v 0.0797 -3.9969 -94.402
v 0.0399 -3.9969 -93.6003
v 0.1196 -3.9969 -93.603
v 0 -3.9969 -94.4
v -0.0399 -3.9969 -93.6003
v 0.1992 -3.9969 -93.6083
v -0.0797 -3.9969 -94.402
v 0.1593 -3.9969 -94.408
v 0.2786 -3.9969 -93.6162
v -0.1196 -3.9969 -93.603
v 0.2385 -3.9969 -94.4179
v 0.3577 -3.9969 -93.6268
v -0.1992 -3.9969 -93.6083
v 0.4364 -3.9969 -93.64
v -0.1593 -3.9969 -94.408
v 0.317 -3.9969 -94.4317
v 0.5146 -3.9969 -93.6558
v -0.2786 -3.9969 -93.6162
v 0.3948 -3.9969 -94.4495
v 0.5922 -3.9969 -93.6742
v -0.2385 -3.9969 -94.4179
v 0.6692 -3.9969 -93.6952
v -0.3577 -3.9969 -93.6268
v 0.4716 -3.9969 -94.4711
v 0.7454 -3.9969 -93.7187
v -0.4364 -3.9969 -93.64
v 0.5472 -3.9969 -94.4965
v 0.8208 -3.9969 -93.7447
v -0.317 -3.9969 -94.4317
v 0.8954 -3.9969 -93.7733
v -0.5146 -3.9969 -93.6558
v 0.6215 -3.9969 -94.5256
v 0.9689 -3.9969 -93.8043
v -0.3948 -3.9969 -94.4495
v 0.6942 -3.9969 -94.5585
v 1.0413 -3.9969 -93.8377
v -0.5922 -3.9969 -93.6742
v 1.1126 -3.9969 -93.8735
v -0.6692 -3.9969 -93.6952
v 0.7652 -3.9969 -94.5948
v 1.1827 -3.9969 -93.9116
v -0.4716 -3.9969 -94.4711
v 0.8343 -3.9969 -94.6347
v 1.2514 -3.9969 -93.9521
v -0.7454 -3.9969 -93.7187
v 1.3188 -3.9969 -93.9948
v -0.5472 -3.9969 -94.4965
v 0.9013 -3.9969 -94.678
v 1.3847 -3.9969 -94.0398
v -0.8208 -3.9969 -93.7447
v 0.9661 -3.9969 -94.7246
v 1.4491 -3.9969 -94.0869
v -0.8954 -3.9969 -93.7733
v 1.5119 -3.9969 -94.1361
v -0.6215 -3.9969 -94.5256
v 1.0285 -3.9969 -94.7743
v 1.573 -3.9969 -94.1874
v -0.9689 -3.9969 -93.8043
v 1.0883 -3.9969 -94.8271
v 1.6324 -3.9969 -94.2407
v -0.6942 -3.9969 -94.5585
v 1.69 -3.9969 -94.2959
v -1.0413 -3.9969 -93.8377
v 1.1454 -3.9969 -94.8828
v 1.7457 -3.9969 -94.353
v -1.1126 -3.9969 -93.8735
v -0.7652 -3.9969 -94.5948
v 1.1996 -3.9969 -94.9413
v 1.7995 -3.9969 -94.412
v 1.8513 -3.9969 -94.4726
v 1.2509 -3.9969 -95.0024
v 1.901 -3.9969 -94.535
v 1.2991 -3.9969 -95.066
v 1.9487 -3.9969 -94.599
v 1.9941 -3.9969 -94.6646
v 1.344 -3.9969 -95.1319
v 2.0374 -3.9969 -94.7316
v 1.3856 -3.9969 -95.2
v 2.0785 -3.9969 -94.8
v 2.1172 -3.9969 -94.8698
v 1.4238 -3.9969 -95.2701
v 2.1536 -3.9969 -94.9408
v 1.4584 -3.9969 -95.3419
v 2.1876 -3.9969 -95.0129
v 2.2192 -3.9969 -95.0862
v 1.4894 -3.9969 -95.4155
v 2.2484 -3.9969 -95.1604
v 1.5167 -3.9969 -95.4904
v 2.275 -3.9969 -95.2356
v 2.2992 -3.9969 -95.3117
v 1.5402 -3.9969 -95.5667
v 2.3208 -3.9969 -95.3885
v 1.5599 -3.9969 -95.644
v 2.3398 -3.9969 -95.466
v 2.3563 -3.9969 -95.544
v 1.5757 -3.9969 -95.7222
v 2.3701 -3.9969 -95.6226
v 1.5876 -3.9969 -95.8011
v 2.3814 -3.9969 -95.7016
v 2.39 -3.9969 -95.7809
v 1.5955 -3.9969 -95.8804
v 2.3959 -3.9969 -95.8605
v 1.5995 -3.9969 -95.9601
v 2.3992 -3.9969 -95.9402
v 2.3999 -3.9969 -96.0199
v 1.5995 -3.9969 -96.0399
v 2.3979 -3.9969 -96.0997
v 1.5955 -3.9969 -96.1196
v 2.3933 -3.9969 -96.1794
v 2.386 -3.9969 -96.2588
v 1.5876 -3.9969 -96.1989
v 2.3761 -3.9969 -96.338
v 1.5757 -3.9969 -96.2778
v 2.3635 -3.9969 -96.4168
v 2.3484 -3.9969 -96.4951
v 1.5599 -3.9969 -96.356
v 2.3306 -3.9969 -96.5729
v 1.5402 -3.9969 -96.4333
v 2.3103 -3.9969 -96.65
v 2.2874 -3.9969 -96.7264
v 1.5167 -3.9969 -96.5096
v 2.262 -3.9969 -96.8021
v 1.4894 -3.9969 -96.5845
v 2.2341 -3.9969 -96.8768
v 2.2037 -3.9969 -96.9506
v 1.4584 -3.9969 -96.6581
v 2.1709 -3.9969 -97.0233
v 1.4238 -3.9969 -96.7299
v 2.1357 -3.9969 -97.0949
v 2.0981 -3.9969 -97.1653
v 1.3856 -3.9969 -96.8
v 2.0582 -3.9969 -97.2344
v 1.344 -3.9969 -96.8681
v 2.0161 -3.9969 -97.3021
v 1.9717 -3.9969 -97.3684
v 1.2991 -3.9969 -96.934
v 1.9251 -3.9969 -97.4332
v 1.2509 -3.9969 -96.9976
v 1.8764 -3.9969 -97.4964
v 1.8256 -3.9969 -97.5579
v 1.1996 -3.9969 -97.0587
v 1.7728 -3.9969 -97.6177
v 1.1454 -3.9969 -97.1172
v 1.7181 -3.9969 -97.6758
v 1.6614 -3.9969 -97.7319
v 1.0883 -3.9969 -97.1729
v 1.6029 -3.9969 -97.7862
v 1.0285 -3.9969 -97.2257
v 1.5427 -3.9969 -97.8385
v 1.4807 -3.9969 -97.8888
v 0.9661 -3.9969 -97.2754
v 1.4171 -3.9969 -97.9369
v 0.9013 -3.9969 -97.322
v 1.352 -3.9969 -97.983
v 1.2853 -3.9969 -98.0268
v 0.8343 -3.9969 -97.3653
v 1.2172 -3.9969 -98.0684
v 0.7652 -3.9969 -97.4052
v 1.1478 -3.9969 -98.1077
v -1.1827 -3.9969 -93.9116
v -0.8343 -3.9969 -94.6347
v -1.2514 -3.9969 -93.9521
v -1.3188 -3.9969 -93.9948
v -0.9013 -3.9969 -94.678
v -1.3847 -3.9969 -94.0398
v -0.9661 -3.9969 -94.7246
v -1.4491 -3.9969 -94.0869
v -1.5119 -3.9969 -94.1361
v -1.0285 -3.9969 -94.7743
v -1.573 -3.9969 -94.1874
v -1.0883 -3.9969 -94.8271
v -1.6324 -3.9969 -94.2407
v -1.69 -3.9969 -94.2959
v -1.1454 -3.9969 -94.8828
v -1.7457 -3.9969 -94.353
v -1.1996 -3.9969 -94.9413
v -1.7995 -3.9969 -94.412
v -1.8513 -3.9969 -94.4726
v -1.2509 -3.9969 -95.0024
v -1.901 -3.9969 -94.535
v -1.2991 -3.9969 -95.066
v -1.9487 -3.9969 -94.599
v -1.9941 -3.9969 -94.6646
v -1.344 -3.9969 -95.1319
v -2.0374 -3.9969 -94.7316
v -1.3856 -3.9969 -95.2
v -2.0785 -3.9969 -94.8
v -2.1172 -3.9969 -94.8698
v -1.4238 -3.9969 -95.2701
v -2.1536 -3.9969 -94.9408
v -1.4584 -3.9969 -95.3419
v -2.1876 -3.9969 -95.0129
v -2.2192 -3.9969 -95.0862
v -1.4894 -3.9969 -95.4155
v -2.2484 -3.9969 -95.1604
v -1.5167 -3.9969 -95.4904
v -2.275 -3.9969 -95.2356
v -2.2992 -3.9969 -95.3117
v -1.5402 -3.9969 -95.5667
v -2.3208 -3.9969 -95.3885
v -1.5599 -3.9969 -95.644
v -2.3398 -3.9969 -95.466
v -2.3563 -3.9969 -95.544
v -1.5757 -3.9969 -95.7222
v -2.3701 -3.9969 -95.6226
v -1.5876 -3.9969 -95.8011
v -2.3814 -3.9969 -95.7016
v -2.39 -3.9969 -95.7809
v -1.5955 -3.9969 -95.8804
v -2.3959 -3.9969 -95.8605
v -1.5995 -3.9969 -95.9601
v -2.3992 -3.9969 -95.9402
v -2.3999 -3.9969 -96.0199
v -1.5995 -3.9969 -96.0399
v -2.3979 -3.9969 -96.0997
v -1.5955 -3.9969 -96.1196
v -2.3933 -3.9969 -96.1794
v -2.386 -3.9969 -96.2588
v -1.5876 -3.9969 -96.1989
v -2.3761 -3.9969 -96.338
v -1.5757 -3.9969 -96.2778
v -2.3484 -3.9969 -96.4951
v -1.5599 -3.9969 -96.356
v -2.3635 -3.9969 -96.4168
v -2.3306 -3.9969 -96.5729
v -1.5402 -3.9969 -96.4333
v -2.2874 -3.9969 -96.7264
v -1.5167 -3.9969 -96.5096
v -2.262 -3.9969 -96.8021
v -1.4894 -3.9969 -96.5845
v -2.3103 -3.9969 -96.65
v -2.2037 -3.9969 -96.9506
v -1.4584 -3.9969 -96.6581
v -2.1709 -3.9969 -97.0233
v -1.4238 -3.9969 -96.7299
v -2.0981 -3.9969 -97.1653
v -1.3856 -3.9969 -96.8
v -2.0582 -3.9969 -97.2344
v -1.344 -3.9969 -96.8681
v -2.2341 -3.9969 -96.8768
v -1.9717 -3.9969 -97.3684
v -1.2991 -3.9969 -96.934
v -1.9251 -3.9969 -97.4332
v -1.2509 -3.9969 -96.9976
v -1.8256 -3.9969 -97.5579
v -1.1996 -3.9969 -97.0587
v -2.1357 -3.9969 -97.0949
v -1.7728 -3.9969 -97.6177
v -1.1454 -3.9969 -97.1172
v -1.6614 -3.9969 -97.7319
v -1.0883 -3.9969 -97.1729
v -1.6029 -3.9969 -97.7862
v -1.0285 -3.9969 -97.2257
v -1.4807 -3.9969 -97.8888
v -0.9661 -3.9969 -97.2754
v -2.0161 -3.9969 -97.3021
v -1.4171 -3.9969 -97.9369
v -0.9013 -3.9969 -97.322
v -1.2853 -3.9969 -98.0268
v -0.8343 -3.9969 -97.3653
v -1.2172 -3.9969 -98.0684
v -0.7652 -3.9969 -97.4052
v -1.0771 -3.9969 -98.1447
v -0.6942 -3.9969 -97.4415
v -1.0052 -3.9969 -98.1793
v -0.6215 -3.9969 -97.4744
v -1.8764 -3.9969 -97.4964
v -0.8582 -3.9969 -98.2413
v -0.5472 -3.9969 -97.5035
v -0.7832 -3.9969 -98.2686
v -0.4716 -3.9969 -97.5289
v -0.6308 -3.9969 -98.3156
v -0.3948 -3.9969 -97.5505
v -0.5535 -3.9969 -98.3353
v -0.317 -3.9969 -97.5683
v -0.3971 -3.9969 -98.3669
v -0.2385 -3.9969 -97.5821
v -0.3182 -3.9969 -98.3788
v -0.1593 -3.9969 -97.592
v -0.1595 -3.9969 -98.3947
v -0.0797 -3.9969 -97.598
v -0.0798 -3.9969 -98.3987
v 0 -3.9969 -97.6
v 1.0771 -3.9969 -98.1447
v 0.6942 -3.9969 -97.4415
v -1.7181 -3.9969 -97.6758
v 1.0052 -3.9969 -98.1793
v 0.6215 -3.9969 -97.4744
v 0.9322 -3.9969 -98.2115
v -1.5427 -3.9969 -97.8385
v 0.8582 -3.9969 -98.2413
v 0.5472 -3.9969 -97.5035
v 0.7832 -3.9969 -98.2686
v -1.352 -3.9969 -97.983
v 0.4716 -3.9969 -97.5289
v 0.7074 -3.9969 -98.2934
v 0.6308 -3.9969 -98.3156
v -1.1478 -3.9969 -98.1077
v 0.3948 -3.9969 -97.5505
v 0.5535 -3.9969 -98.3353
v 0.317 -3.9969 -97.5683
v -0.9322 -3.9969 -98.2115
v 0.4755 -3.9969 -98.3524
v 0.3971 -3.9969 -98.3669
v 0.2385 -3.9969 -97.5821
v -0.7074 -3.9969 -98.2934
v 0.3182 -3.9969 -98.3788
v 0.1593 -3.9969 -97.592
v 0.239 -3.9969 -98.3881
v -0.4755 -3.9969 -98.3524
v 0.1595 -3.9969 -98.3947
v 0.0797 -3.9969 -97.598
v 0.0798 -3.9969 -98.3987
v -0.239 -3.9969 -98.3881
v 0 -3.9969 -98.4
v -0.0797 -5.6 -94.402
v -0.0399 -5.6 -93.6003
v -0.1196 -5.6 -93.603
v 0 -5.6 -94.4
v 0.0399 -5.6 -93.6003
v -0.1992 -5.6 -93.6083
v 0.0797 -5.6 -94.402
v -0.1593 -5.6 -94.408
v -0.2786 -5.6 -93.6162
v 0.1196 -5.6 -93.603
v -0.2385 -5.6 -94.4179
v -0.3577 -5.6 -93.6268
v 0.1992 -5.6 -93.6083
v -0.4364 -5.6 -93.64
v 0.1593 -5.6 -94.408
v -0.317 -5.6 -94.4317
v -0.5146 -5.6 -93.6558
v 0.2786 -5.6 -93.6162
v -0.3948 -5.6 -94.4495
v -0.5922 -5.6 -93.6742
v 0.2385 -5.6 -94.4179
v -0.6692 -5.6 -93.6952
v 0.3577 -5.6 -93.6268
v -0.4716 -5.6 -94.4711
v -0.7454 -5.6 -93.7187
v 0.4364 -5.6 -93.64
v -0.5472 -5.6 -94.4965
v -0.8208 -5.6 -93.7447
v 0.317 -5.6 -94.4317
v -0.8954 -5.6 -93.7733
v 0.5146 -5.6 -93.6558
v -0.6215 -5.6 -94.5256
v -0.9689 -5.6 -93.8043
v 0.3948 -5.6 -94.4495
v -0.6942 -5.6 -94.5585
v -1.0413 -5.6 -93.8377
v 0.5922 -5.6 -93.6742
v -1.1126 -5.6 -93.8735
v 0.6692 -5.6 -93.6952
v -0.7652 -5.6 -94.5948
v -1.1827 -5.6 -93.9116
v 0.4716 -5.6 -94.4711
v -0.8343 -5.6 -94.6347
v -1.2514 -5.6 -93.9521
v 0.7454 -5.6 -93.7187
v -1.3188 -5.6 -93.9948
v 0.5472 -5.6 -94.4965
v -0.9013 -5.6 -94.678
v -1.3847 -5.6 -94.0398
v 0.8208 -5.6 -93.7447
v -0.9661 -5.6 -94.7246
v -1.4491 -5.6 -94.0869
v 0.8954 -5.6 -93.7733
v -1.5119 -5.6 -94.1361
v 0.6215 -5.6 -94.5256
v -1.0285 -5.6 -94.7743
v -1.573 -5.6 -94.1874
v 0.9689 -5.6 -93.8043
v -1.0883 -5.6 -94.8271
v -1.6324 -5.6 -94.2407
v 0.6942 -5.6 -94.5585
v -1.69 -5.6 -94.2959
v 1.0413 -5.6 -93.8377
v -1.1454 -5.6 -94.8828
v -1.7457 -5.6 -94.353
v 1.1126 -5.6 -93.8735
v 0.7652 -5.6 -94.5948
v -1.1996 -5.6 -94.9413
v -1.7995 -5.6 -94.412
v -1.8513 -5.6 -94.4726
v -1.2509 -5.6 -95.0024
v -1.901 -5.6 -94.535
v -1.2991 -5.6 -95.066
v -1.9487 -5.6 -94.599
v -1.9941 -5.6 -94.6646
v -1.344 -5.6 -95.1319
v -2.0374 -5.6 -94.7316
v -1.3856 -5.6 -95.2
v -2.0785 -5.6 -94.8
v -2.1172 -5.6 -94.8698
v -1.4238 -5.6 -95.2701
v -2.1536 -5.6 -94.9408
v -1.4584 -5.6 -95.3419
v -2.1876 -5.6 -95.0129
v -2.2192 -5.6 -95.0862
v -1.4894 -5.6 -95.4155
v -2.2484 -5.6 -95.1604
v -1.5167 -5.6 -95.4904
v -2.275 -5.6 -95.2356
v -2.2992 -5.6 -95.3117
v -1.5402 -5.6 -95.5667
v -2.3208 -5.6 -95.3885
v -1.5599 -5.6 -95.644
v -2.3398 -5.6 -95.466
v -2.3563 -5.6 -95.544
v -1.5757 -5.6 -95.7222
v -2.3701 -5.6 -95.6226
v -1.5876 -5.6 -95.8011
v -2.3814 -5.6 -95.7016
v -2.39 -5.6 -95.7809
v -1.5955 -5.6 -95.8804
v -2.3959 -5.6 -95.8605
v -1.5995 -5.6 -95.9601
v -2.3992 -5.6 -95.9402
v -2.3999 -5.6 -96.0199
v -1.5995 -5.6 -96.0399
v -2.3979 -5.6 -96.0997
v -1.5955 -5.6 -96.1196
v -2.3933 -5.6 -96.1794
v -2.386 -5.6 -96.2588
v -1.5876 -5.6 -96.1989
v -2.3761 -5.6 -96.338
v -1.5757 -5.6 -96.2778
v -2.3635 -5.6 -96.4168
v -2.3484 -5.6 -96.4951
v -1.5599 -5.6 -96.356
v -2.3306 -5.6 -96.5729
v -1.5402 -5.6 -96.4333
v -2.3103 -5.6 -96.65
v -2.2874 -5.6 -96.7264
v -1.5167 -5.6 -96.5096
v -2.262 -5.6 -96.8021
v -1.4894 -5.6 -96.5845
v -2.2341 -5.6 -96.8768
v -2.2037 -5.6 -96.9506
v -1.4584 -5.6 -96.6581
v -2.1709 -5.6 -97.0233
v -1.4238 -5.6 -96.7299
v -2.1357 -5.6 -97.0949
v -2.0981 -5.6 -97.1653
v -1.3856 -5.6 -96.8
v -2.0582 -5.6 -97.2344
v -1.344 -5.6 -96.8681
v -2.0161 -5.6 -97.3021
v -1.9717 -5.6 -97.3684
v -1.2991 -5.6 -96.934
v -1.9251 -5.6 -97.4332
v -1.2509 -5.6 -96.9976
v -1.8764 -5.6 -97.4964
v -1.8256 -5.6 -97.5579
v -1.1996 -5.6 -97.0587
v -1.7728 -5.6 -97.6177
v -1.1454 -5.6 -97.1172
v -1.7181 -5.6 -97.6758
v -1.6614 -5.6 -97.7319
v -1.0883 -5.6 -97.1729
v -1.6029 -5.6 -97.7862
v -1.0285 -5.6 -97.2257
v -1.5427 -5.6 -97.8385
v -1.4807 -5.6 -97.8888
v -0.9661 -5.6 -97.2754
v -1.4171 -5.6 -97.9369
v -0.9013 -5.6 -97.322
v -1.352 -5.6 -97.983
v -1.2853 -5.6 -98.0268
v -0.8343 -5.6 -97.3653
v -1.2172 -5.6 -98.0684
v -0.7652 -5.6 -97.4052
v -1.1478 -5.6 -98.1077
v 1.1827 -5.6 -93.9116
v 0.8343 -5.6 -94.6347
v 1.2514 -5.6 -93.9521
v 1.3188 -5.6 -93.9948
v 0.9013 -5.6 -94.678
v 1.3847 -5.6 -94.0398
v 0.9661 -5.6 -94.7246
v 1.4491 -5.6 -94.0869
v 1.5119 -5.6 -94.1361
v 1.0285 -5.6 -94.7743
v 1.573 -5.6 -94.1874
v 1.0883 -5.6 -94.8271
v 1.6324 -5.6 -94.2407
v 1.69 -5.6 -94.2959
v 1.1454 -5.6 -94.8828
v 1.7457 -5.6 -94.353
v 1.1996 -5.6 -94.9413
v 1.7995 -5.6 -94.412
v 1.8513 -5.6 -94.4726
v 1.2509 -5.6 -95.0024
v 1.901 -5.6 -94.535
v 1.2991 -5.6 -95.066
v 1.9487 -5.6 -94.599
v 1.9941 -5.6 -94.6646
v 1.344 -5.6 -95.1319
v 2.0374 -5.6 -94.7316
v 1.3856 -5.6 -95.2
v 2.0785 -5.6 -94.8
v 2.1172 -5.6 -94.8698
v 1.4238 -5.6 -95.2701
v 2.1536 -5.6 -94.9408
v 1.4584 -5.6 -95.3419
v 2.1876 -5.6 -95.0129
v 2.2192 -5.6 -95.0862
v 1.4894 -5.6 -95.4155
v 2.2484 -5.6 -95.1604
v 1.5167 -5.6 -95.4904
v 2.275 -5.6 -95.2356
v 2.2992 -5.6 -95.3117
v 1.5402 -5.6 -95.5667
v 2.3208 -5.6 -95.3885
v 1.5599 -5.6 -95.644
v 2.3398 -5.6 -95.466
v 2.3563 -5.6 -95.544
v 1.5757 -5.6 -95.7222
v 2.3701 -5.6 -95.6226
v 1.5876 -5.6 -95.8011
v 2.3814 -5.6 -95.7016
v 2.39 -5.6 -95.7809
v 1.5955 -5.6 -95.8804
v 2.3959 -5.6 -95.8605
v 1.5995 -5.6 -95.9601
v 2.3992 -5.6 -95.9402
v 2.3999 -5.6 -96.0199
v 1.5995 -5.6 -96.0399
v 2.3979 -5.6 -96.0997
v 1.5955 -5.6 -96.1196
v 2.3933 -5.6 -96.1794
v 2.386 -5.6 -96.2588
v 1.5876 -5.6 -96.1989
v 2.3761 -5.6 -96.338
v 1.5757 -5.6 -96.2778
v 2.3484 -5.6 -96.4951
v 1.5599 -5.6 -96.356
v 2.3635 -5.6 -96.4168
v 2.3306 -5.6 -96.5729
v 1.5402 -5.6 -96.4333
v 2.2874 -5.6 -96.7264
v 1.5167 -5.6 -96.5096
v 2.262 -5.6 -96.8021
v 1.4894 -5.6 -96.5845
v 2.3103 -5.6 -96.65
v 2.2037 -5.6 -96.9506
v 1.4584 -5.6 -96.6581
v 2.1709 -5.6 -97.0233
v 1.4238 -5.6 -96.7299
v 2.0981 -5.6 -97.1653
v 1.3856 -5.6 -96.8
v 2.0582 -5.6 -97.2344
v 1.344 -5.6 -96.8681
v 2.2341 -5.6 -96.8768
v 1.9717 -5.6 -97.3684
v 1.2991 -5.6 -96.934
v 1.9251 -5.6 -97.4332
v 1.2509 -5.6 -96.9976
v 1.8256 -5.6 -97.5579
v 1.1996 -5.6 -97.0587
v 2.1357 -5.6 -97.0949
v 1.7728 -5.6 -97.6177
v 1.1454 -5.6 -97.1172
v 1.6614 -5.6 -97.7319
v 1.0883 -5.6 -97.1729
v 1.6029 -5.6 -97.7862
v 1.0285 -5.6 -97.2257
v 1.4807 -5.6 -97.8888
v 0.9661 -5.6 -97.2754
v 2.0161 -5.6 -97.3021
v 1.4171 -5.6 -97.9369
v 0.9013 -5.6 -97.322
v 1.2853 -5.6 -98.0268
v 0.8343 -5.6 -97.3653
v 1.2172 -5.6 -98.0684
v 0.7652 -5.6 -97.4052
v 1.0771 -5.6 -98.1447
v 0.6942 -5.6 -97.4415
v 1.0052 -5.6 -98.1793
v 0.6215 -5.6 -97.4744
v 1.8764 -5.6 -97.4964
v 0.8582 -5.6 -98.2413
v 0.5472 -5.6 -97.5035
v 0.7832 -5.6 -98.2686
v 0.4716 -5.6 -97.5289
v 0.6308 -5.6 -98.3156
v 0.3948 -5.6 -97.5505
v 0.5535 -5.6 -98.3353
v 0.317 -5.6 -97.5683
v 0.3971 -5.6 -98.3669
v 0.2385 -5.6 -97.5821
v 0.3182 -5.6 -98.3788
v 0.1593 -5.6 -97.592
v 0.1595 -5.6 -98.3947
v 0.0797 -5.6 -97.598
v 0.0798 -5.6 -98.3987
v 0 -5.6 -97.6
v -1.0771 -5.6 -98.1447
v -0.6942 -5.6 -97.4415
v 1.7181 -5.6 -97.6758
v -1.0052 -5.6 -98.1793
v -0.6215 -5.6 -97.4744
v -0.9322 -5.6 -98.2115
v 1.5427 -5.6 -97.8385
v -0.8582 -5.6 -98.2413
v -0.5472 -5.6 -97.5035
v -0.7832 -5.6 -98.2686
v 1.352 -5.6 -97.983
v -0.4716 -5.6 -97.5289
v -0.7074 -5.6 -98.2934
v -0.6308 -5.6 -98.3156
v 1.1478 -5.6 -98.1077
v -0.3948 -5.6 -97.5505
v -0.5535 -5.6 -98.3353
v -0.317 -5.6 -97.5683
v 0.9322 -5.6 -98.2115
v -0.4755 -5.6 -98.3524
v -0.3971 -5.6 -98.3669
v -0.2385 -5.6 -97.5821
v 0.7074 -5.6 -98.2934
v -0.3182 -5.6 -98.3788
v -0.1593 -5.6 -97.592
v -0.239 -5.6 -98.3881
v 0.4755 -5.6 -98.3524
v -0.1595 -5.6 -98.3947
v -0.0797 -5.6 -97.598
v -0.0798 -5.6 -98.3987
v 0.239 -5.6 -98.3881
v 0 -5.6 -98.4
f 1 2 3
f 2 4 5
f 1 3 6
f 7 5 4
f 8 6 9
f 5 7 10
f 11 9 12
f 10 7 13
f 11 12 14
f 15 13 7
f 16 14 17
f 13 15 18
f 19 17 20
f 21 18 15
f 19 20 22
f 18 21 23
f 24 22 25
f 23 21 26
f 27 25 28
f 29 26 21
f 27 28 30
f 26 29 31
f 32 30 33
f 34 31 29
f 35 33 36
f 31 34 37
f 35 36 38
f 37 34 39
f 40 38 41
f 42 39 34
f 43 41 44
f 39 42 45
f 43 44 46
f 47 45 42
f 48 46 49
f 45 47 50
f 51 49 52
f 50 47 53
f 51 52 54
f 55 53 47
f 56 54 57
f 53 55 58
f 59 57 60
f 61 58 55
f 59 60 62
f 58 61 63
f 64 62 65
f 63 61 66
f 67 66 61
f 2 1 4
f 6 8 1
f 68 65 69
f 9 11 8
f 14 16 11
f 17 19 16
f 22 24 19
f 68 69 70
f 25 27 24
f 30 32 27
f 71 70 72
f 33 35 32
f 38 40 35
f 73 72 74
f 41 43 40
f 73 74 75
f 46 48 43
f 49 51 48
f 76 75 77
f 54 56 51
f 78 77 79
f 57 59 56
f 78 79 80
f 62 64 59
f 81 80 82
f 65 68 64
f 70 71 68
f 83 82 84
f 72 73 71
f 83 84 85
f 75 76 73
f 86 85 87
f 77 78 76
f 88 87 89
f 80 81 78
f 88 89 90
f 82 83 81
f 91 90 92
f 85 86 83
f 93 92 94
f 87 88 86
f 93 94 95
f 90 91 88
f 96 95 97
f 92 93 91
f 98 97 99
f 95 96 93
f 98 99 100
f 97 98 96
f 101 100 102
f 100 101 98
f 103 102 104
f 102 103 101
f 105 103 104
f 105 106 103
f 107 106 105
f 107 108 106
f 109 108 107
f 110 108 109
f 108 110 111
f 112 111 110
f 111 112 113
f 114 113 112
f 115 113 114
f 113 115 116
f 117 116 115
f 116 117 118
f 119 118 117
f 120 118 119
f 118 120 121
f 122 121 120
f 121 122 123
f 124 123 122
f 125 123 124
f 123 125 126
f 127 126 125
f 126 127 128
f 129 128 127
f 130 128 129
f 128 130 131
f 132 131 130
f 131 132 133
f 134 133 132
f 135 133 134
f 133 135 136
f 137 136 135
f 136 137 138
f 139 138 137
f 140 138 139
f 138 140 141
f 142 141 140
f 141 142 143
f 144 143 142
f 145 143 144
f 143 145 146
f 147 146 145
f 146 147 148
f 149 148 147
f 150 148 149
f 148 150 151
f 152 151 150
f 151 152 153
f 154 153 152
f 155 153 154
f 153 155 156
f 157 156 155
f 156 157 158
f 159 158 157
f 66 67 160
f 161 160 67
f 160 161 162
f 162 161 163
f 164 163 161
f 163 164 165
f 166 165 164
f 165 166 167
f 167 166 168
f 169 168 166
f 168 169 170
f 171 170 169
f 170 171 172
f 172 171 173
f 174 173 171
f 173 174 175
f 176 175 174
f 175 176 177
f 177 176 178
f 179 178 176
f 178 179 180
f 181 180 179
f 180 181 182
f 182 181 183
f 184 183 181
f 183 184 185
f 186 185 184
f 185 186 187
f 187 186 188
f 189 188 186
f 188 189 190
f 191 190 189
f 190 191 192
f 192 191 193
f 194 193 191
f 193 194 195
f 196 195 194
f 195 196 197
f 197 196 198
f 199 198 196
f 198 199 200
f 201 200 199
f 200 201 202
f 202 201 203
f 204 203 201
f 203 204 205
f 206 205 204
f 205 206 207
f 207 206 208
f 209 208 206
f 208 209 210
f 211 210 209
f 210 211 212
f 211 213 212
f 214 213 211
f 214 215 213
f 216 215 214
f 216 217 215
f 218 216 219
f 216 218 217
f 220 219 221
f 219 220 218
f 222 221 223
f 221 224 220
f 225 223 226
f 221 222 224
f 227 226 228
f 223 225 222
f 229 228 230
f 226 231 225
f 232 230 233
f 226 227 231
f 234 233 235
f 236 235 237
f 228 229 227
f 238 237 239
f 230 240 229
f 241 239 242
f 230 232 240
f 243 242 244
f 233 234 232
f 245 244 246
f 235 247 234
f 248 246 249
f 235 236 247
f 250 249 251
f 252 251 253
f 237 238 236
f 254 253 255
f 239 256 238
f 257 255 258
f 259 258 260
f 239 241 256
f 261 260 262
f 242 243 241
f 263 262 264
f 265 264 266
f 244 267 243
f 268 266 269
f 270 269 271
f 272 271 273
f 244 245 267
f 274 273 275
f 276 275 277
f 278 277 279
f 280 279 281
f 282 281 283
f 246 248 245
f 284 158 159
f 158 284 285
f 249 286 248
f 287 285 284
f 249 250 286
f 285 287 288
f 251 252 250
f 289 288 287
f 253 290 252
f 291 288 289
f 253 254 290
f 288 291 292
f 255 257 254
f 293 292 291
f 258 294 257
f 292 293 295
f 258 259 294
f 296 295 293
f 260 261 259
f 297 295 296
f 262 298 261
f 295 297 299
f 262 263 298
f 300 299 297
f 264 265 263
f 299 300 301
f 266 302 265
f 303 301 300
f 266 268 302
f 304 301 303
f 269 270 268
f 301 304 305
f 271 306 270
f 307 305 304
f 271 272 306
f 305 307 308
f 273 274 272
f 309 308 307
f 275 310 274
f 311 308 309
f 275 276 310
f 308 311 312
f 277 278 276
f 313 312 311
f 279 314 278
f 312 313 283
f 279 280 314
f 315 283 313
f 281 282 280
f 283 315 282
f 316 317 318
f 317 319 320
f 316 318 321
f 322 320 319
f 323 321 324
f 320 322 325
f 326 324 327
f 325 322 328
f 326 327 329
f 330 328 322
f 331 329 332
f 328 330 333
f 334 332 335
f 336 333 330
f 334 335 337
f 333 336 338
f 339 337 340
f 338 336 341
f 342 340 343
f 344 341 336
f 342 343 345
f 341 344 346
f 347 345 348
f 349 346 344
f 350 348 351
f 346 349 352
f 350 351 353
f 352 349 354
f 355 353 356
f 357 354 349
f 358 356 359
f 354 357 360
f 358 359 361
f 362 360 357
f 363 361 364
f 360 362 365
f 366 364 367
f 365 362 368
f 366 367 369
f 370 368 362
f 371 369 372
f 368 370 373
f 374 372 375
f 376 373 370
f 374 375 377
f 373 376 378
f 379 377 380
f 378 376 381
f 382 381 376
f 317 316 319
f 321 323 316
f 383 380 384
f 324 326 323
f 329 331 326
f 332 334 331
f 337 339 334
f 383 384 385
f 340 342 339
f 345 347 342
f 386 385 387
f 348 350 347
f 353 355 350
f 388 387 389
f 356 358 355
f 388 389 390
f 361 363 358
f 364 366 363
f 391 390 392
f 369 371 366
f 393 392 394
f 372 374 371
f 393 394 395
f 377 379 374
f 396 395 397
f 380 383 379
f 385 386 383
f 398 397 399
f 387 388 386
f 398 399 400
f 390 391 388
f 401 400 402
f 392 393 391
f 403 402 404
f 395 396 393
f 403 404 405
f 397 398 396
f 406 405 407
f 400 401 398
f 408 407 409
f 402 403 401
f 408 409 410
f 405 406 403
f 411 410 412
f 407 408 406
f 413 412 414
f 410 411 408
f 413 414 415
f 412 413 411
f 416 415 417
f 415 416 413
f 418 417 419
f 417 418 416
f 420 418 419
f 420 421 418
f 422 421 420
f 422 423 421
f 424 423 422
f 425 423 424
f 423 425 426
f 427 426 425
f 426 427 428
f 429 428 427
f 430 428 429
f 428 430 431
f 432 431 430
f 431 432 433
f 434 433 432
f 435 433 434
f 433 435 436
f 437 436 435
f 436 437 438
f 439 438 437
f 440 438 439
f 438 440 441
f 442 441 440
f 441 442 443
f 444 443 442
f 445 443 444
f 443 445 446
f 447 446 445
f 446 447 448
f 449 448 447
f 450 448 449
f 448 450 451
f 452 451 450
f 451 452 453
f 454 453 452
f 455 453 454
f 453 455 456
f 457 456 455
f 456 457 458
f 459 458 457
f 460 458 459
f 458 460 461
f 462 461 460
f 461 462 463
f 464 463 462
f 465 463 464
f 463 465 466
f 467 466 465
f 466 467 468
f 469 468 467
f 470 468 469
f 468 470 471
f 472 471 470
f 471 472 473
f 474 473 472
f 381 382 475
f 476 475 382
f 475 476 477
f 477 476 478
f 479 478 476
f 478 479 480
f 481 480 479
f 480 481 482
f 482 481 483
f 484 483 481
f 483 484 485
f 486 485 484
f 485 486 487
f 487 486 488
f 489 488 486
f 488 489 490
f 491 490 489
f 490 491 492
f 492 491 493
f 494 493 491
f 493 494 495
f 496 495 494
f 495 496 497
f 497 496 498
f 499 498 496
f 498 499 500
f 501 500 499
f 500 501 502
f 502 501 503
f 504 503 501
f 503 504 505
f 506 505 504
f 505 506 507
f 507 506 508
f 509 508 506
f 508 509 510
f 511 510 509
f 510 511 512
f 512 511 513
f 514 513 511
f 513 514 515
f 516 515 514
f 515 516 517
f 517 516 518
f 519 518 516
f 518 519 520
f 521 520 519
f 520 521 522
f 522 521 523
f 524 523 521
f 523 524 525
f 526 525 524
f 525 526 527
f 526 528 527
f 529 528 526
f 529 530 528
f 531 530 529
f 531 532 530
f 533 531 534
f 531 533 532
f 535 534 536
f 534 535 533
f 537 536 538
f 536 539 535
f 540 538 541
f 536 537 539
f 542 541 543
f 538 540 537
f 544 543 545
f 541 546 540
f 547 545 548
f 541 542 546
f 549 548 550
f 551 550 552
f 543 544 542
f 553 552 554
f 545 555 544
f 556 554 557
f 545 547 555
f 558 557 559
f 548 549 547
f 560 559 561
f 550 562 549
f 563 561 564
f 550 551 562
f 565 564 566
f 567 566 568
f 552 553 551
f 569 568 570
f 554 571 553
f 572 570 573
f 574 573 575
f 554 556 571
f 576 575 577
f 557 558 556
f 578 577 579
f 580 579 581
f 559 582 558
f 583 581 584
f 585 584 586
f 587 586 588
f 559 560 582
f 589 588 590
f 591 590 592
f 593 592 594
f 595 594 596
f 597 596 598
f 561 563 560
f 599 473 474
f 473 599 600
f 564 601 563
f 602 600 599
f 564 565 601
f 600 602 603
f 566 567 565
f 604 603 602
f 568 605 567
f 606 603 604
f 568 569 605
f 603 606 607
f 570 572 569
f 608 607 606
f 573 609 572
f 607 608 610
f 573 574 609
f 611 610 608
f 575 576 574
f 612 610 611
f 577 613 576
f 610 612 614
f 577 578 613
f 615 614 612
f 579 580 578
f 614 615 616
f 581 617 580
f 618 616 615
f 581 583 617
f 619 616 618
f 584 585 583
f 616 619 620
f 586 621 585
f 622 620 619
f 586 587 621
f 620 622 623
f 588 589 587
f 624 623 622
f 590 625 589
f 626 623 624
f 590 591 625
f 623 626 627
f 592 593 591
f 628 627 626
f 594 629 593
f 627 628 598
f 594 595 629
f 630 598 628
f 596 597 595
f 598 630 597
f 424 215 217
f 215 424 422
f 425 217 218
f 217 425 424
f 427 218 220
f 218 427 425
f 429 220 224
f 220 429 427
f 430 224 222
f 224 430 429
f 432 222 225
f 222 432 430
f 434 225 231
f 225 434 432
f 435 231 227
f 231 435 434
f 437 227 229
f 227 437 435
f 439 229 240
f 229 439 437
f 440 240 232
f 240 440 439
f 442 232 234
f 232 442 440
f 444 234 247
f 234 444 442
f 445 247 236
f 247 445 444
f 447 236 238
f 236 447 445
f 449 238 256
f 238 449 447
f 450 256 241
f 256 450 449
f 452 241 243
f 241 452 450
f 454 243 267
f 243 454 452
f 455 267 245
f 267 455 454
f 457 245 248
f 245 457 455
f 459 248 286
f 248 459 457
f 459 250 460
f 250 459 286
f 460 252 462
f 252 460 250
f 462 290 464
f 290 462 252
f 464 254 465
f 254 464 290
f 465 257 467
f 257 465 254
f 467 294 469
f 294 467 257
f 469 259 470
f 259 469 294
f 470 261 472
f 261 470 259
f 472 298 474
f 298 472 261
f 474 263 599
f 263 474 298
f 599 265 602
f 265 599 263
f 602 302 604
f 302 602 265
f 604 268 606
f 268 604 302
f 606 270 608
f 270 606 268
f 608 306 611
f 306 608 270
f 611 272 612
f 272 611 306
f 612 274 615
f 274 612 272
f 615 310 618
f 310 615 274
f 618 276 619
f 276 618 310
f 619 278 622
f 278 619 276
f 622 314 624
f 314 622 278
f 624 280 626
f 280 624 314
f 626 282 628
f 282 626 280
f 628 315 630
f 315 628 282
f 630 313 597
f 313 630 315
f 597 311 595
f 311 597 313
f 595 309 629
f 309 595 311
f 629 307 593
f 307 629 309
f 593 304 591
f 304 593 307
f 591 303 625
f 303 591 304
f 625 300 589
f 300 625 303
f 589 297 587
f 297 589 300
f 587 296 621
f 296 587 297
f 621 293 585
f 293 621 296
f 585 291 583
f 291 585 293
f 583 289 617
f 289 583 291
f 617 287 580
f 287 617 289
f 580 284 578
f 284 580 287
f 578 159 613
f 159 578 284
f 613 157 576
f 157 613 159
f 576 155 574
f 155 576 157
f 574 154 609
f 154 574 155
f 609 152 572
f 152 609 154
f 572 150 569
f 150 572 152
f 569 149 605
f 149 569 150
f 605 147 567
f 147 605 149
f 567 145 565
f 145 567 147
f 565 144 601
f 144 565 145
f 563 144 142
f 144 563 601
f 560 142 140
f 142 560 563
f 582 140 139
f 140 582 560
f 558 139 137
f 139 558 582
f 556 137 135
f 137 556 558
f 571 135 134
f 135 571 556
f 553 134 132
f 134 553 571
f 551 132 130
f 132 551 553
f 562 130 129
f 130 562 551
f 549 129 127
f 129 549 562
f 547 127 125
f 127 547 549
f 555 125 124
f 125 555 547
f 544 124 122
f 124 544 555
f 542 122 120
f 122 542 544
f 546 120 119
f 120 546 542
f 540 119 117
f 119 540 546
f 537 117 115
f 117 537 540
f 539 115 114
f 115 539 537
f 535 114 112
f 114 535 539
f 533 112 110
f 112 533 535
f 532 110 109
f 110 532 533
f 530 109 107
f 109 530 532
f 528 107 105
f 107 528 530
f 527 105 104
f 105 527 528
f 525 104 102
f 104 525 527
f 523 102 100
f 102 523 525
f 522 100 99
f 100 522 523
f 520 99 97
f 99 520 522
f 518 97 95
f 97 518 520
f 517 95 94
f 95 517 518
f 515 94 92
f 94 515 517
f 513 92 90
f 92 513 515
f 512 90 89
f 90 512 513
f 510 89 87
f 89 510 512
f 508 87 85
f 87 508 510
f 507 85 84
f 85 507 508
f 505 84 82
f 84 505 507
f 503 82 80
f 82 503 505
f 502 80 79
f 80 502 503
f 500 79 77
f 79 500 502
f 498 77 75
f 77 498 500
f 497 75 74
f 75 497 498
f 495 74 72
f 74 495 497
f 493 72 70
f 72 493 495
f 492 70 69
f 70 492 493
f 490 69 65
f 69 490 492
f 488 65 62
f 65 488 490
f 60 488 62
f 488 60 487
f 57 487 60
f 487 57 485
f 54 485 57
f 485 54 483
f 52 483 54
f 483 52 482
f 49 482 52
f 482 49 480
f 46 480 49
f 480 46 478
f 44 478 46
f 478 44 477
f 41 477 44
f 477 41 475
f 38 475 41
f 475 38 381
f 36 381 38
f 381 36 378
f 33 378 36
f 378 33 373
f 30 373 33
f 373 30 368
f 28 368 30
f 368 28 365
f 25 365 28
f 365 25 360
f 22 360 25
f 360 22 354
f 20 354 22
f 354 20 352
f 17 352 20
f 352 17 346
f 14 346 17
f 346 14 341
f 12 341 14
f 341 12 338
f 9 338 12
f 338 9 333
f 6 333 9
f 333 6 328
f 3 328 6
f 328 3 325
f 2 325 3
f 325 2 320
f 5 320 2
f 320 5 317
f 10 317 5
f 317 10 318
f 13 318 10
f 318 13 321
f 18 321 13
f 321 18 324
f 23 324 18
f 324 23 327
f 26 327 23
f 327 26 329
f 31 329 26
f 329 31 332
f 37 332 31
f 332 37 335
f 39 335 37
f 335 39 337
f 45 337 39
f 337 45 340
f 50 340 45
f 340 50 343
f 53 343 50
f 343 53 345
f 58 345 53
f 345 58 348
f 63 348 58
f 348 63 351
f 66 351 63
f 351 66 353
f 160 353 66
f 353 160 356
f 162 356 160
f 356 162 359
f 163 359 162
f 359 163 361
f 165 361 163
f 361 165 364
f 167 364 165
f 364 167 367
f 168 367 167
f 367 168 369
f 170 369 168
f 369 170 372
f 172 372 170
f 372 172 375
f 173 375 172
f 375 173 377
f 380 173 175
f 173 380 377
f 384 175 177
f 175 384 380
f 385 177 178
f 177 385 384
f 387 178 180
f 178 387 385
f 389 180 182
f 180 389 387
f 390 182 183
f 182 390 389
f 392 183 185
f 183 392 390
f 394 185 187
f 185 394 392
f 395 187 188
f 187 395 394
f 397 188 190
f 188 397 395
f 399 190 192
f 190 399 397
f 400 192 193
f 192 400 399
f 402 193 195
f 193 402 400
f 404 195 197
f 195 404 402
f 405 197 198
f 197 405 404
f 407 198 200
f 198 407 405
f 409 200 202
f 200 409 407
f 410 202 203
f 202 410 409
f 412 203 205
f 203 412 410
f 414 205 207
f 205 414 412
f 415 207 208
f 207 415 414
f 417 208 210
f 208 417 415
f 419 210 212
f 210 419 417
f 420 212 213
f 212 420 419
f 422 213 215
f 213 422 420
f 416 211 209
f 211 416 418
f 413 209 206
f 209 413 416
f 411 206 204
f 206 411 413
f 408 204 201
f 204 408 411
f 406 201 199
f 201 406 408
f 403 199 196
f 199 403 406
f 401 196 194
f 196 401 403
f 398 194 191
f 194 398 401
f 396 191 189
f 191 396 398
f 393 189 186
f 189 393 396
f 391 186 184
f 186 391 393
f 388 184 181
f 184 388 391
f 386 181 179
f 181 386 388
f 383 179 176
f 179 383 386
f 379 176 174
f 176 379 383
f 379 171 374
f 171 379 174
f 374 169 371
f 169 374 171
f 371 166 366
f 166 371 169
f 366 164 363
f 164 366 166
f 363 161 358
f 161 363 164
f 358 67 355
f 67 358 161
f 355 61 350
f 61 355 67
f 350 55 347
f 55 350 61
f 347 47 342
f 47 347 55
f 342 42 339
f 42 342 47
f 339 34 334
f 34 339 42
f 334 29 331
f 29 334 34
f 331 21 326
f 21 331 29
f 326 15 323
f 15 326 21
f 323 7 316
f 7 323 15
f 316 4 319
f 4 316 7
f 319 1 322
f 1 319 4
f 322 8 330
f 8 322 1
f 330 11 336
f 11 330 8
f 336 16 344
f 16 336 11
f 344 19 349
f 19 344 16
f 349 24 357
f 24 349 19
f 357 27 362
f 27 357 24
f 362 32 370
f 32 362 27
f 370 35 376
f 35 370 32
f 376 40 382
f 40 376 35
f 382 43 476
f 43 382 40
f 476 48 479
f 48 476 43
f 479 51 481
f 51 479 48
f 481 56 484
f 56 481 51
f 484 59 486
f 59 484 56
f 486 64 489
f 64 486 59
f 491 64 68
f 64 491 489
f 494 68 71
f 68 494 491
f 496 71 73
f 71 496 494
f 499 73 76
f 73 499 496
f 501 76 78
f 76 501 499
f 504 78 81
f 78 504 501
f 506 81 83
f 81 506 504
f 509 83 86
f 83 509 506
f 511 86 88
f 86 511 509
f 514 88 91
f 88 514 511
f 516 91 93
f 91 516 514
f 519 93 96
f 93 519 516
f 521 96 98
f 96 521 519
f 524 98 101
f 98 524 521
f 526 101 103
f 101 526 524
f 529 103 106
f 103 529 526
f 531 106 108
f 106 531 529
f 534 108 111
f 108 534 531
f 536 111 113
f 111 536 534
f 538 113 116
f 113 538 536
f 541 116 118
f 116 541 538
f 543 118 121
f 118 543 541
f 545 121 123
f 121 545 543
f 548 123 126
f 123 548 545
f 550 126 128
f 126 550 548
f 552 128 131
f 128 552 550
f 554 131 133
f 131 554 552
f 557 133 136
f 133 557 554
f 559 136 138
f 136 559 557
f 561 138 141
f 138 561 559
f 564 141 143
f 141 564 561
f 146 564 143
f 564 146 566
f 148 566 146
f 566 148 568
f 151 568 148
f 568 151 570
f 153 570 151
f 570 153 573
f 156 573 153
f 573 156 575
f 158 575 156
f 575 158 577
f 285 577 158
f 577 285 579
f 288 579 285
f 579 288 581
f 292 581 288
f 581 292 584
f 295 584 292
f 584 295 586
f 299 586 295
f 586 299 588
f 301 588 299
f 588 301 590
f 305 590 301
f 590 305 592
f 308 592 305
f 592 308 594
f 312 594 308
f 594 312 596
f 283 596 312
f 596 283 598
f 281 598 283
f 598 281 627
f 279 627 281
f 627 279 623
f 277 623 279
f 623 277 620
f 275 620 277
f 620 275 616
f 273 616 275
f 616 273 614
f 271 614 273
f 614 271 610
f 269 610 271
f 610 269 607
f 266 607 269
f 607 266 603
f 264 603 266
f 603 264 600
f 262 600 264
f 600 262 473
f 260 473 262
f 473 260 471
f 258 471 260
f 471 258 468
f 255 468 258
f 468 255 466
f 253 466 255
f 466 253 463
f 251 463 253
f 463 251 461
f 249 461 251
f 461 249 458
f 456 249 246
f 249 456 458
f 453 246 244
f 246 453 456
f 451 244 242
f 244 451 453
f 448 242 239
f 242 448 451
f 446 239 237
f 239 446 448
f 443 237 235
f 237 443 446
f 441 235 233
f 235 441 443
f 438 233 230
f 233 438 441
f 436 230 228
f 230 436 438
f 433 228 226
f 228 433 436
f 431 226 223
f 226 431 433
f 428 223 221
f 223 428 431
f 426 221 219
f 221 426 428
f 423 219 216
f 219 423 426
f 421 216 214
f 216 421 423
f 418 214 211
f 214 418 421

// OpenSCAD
use <../lib.scad>
use <../p/clip13.scad>
use <../p/rect1.scad>
use <s/18969s01.scad>
use <../p/stud2.scad>
$fa=1; $fs=0.2;
function ldraw_lib__18969(realsolid=false) = [
// 0 Panel  4 x  4 x 13 Curved Tapered with Clip at Each End
// 0 Name: 18969.dat
// 0 Author: Philippe Hurbain [Philo]
// 0 !LDRAW_ORG Part UPDATE 2019-03
// 0 !LICENSE Licensed under CC BY 2.0 and CC BY 4.0 : see CAreadme.txt
// 
// 0 BFC CERTIFY CCW
  [0,"BFC","CERTIFY"],
  [0,"BFC","CCW"],
// 
// 0 !KEYWORDS Balloon, Ballooning, Hot-Air
// 
// 0 !HISTORY 2016-03-18 {LEGO Digital Designer} Original part shape
// 0 !HISTORY 2016-06-09 [Philo] File preparation for LDraw Parts Tracker
// 0 !HISTORY 2019-12-27 [PTadmin] Official Update 2019-03
// 
// 
// 1 16 0 0 0 1 0 0 0 1 0 0 0 1 s\18969s01.dat
  [1,16,0,0,0,1,0,0,0,1,0,0,0,1, ldraw_lib__s__18969s01(realsolid)],
// 1 16 0 0 0 -1 0 0 0 1 0 0 0 1 s\18969s01.dat
  [1,16,0,0,0,-1,0,0,0,1,0,0,0,1, ldraw_lib__s__18969s01(realsolid)],
// 1 16 0 0 0 0 1 0 1 0 0 0 0 -1 clip13.dat
  [1,16,0,0,0,0,1,0,1,0,0,0,0,-1, ldraw_lib__clip13(realsolid)],
// 1 16 0 240 0 0 1 0 1 0 0 0 0 -1 clip13.dat
  [1,16,0,240,0,0,1,0,1,0,0,0,0,-1, ldraw_lib__clip13(realsolid)],
// 2 24 3.95 0.907 -14.704 -3.95 0.907 -14.704
  [2,24,3.95,0.907,-14.704,-3.95,0.907,-14.704],
// 1 16 0 -4.1808 -5.77225 0 0 4 2.1448 0 0 -1.57575 1 0 rect1.dat
  [1,16,0,-4.1808,-5.77225,0,0,4,2.1448,0,0,-1.57575,1,0, ldraw_lib__rect1(realsolid)],
// 4 16 3.95 0.907 -14.704 4 -2.036 -7.348 -4 -2.036 -7.348 -3.95 0.907 -14.704
  [4,16,3.95,0.907,-14.704,4,-2.036,-7.348,-4,-2.036,-7.348,-3.95,0.907,-14.704],
// 3 16 3.95 0.907 -14.704 -3.95 0.907 -14.704 0 6.256 -32.044
  [3,16,3.95,0.907,-14.704,-3.95,0.907,-14.704,0,6.256,-32.044],
// 3 16 -3.996 5.425 -14.508 3.996 5.425 -14.508 0 10.228 -29.339
  [3,16,-3.996,5.425,-14.508,3.996,5.425,-14.508,0,10.228,-29.339],
// 1 16 0 5.8753 -4.77725 0 0 -4 -0.4503 -1 0 -0.58075 0 0 rect1.dat
  [1,16,0,5.8753,-4.77725,0,0,-4,-0.4503,-1,0,-0.58075,0,0, ldraw_lib__rect1(realsolid)],
// 1 16 0 5.425 -9.933 -0.002 0 -4 0 -1 0 -4.575 0 0 rect1.dat
  [1,16,0,5.425,-9.933,-0.002,0,-4,0,-1,0,-4.575,0,0, ldraw_lib__rect1(realsolid)],
// 2 24 -16.486 249.776 -10 16.486 249.776 -10
  [2,24,-16.486,249.776,-10,16.486,249.776,-10],
// 2 24 14.606 249.776 -5.263 -14.606 249.776 -5.263
  [2,24,14.606,249.776,-5.263,-14.606,249.776,-5.263],
// 3 16 -8.199 229.91 -10 8.199 229.91 -10 0 217.557 -11.364
  [3,16,-8.199,229.91,-10,8.199,229.91,-10,0,217.557,-11.364],
// 4 16 8.199 229.91 -10 -8.199 229.91 -10 -16.486 249.776 -10 16.486 249.776 -10
  [4,16,8.199,229.91,-10,-8.199,229.91,-10,-16.486,249.776,-10,16.486,249.776,-10],
// 4 16 16.486 249.776 -10 -16.486 249.776 -10 -14.606 249.776 -5.263 14.606 249.776 -5.263
  [4,16,16.486,249.776,-10,-16.486,249.776,-10,-14.606,249.776,-5.263,14.606,249.776,-5.263],
// 4 16 -4 245.482 -5.263 4 245.482 -5.263 14.606 249.776 -5.263 -14.606 249.776 -5.263
  [4,16,-4,245.482,-5.263,4,245.482,-5.263,14.606,249.776,-5.263,-14.606,249.776,-5.263],
// 1 16 0 245.904 -4.72975 0 0 -4 -0.422 -1 0 -0.53325 0 0 rect1.dat
  [1,16,0,245.904,-4.72975,0,0,-4,-0.422,-1,0,-0.53325,0,0, ldraw_lib__rect1(realsolid)],
// 1 16 0 234.096 -4.74825 0 0 4 0.422 1 0 -0.55175 0 0 rect1.dat
  [1,16,0,234.096,-4.74825,0,0,4,0.422,1,0,-0.55175,0,0, ldraw_lib__rect1(realsolid)],
// 4 16 4 234.518 -5.3 -4 234.518 -5.3 -6.612 229.345 -5.3 6.612 229.345 -5.3
  [4,16,4,234.518,-5.3,-4,234.518,-5.3,-6.612,229.345,-5.3,6.612,229.345,-5.3],
// 3 16 6.612 229.345 -5.3 -6.612 229.345 -5.3 0 218.024 -5.818
  [3,16,6.612,229.345,-5.3,-6.612,229.345,-5.3,0,218.024,-5.818],
// 1 16 0 240 -10 1 0 0 0 0 -1 0 1 0 stud2.dat
  [1,16,0,240,-10,1,0,0,0,0,-1,0,1,0, ldraw_lib__stud2(realsolid)],
// 5 24 -8.199 229.91 -10 8.199 229.91 -10 0 217.557 -11.364 -16.486 249.776 -10
  [5,24,-8.199,229.91,-10,8.199,229.91,-10,0,217.557,-11.364,-16.486,249.776,-10],
// 5 24 -4 234.518 -5.3 -6.612 229.345 -5.3 4 234.518 -5.3 -14.635 234.566 -5.333
  [5,24,-4,234.518,-5.3,-6.612,229.345,-5.3,4,234.518,-5.3,-14.635,234.566,-5.333],
// 5 24 -6.612 229.345 -5.3 6.612 229.345 -5.3 4 234.518 -5.3 0 218.024 -5.818
  [5,24,-6.612,229.345,-5.3,6.612,229.345,-5.3,4,234.518,-5.3,0,218.024,-5.818],
// 5 24 6.612 229.345 -5.3 4 234.518 -5.3 -4 234.518 -5.3 14.635 234.566 -5.333
  [5,24,6.612,229.345,-5.3,4,234.518,-5.3,-4,234.518,-5.3,14.635,234.566,-5.333],
// 5 24 4 -6.3256 -4.1965 -4 -6.3256 -4.1965 -4 -2.036 -7.348 -4 -7.46125 -1.53715
  [5,24,4,-6.3256,-4.1965,-4,-6.3256,-4.1965,-4,-2.036,-7.348,-4,-7.46125,-1.53715],
// 5 24 -4 6.3256 -4.1965 4 6.3256 -4.1965 4 5.425 -5.358 -4 7.46125 -1.53715
  [5,24,-4,6.3256,-4.1965,4,6.3256,-4.1965,4,5.425,-5.358,-4,7.46125,-1.53715],
// 5 24 -4 246.326 -4.1965 4 246.326 -4.1965 4 245.482 -5.263 -4 247.461 -1.53715
  [5,24,-4,246.326,-4.1965,4,246.326,-4.1965,4,245.482,-5.263,-4,247.461,-1.53715],
// 5 24 4 233.674 -4.1965 -4 233.674 -4.1965 -4 234.518 -5.3 -4 232.539 -1.53715
  [5,24,4,233.674,-4.1965,-4,233.674,-4.1965,-4,234.518,-5.3,-4,232.539,-1.53715],
];
module ldraw_lib__18969(step=0, col=false, unit=2/5, alt=false, line=0.2, solid=!$preview)
    makepoly(ldraw_lib__18969(solid), step=step, col=col, unit=unit, alt=alt, line=line, solid=solid);
ldraw_lib__18969(line=0.2);
